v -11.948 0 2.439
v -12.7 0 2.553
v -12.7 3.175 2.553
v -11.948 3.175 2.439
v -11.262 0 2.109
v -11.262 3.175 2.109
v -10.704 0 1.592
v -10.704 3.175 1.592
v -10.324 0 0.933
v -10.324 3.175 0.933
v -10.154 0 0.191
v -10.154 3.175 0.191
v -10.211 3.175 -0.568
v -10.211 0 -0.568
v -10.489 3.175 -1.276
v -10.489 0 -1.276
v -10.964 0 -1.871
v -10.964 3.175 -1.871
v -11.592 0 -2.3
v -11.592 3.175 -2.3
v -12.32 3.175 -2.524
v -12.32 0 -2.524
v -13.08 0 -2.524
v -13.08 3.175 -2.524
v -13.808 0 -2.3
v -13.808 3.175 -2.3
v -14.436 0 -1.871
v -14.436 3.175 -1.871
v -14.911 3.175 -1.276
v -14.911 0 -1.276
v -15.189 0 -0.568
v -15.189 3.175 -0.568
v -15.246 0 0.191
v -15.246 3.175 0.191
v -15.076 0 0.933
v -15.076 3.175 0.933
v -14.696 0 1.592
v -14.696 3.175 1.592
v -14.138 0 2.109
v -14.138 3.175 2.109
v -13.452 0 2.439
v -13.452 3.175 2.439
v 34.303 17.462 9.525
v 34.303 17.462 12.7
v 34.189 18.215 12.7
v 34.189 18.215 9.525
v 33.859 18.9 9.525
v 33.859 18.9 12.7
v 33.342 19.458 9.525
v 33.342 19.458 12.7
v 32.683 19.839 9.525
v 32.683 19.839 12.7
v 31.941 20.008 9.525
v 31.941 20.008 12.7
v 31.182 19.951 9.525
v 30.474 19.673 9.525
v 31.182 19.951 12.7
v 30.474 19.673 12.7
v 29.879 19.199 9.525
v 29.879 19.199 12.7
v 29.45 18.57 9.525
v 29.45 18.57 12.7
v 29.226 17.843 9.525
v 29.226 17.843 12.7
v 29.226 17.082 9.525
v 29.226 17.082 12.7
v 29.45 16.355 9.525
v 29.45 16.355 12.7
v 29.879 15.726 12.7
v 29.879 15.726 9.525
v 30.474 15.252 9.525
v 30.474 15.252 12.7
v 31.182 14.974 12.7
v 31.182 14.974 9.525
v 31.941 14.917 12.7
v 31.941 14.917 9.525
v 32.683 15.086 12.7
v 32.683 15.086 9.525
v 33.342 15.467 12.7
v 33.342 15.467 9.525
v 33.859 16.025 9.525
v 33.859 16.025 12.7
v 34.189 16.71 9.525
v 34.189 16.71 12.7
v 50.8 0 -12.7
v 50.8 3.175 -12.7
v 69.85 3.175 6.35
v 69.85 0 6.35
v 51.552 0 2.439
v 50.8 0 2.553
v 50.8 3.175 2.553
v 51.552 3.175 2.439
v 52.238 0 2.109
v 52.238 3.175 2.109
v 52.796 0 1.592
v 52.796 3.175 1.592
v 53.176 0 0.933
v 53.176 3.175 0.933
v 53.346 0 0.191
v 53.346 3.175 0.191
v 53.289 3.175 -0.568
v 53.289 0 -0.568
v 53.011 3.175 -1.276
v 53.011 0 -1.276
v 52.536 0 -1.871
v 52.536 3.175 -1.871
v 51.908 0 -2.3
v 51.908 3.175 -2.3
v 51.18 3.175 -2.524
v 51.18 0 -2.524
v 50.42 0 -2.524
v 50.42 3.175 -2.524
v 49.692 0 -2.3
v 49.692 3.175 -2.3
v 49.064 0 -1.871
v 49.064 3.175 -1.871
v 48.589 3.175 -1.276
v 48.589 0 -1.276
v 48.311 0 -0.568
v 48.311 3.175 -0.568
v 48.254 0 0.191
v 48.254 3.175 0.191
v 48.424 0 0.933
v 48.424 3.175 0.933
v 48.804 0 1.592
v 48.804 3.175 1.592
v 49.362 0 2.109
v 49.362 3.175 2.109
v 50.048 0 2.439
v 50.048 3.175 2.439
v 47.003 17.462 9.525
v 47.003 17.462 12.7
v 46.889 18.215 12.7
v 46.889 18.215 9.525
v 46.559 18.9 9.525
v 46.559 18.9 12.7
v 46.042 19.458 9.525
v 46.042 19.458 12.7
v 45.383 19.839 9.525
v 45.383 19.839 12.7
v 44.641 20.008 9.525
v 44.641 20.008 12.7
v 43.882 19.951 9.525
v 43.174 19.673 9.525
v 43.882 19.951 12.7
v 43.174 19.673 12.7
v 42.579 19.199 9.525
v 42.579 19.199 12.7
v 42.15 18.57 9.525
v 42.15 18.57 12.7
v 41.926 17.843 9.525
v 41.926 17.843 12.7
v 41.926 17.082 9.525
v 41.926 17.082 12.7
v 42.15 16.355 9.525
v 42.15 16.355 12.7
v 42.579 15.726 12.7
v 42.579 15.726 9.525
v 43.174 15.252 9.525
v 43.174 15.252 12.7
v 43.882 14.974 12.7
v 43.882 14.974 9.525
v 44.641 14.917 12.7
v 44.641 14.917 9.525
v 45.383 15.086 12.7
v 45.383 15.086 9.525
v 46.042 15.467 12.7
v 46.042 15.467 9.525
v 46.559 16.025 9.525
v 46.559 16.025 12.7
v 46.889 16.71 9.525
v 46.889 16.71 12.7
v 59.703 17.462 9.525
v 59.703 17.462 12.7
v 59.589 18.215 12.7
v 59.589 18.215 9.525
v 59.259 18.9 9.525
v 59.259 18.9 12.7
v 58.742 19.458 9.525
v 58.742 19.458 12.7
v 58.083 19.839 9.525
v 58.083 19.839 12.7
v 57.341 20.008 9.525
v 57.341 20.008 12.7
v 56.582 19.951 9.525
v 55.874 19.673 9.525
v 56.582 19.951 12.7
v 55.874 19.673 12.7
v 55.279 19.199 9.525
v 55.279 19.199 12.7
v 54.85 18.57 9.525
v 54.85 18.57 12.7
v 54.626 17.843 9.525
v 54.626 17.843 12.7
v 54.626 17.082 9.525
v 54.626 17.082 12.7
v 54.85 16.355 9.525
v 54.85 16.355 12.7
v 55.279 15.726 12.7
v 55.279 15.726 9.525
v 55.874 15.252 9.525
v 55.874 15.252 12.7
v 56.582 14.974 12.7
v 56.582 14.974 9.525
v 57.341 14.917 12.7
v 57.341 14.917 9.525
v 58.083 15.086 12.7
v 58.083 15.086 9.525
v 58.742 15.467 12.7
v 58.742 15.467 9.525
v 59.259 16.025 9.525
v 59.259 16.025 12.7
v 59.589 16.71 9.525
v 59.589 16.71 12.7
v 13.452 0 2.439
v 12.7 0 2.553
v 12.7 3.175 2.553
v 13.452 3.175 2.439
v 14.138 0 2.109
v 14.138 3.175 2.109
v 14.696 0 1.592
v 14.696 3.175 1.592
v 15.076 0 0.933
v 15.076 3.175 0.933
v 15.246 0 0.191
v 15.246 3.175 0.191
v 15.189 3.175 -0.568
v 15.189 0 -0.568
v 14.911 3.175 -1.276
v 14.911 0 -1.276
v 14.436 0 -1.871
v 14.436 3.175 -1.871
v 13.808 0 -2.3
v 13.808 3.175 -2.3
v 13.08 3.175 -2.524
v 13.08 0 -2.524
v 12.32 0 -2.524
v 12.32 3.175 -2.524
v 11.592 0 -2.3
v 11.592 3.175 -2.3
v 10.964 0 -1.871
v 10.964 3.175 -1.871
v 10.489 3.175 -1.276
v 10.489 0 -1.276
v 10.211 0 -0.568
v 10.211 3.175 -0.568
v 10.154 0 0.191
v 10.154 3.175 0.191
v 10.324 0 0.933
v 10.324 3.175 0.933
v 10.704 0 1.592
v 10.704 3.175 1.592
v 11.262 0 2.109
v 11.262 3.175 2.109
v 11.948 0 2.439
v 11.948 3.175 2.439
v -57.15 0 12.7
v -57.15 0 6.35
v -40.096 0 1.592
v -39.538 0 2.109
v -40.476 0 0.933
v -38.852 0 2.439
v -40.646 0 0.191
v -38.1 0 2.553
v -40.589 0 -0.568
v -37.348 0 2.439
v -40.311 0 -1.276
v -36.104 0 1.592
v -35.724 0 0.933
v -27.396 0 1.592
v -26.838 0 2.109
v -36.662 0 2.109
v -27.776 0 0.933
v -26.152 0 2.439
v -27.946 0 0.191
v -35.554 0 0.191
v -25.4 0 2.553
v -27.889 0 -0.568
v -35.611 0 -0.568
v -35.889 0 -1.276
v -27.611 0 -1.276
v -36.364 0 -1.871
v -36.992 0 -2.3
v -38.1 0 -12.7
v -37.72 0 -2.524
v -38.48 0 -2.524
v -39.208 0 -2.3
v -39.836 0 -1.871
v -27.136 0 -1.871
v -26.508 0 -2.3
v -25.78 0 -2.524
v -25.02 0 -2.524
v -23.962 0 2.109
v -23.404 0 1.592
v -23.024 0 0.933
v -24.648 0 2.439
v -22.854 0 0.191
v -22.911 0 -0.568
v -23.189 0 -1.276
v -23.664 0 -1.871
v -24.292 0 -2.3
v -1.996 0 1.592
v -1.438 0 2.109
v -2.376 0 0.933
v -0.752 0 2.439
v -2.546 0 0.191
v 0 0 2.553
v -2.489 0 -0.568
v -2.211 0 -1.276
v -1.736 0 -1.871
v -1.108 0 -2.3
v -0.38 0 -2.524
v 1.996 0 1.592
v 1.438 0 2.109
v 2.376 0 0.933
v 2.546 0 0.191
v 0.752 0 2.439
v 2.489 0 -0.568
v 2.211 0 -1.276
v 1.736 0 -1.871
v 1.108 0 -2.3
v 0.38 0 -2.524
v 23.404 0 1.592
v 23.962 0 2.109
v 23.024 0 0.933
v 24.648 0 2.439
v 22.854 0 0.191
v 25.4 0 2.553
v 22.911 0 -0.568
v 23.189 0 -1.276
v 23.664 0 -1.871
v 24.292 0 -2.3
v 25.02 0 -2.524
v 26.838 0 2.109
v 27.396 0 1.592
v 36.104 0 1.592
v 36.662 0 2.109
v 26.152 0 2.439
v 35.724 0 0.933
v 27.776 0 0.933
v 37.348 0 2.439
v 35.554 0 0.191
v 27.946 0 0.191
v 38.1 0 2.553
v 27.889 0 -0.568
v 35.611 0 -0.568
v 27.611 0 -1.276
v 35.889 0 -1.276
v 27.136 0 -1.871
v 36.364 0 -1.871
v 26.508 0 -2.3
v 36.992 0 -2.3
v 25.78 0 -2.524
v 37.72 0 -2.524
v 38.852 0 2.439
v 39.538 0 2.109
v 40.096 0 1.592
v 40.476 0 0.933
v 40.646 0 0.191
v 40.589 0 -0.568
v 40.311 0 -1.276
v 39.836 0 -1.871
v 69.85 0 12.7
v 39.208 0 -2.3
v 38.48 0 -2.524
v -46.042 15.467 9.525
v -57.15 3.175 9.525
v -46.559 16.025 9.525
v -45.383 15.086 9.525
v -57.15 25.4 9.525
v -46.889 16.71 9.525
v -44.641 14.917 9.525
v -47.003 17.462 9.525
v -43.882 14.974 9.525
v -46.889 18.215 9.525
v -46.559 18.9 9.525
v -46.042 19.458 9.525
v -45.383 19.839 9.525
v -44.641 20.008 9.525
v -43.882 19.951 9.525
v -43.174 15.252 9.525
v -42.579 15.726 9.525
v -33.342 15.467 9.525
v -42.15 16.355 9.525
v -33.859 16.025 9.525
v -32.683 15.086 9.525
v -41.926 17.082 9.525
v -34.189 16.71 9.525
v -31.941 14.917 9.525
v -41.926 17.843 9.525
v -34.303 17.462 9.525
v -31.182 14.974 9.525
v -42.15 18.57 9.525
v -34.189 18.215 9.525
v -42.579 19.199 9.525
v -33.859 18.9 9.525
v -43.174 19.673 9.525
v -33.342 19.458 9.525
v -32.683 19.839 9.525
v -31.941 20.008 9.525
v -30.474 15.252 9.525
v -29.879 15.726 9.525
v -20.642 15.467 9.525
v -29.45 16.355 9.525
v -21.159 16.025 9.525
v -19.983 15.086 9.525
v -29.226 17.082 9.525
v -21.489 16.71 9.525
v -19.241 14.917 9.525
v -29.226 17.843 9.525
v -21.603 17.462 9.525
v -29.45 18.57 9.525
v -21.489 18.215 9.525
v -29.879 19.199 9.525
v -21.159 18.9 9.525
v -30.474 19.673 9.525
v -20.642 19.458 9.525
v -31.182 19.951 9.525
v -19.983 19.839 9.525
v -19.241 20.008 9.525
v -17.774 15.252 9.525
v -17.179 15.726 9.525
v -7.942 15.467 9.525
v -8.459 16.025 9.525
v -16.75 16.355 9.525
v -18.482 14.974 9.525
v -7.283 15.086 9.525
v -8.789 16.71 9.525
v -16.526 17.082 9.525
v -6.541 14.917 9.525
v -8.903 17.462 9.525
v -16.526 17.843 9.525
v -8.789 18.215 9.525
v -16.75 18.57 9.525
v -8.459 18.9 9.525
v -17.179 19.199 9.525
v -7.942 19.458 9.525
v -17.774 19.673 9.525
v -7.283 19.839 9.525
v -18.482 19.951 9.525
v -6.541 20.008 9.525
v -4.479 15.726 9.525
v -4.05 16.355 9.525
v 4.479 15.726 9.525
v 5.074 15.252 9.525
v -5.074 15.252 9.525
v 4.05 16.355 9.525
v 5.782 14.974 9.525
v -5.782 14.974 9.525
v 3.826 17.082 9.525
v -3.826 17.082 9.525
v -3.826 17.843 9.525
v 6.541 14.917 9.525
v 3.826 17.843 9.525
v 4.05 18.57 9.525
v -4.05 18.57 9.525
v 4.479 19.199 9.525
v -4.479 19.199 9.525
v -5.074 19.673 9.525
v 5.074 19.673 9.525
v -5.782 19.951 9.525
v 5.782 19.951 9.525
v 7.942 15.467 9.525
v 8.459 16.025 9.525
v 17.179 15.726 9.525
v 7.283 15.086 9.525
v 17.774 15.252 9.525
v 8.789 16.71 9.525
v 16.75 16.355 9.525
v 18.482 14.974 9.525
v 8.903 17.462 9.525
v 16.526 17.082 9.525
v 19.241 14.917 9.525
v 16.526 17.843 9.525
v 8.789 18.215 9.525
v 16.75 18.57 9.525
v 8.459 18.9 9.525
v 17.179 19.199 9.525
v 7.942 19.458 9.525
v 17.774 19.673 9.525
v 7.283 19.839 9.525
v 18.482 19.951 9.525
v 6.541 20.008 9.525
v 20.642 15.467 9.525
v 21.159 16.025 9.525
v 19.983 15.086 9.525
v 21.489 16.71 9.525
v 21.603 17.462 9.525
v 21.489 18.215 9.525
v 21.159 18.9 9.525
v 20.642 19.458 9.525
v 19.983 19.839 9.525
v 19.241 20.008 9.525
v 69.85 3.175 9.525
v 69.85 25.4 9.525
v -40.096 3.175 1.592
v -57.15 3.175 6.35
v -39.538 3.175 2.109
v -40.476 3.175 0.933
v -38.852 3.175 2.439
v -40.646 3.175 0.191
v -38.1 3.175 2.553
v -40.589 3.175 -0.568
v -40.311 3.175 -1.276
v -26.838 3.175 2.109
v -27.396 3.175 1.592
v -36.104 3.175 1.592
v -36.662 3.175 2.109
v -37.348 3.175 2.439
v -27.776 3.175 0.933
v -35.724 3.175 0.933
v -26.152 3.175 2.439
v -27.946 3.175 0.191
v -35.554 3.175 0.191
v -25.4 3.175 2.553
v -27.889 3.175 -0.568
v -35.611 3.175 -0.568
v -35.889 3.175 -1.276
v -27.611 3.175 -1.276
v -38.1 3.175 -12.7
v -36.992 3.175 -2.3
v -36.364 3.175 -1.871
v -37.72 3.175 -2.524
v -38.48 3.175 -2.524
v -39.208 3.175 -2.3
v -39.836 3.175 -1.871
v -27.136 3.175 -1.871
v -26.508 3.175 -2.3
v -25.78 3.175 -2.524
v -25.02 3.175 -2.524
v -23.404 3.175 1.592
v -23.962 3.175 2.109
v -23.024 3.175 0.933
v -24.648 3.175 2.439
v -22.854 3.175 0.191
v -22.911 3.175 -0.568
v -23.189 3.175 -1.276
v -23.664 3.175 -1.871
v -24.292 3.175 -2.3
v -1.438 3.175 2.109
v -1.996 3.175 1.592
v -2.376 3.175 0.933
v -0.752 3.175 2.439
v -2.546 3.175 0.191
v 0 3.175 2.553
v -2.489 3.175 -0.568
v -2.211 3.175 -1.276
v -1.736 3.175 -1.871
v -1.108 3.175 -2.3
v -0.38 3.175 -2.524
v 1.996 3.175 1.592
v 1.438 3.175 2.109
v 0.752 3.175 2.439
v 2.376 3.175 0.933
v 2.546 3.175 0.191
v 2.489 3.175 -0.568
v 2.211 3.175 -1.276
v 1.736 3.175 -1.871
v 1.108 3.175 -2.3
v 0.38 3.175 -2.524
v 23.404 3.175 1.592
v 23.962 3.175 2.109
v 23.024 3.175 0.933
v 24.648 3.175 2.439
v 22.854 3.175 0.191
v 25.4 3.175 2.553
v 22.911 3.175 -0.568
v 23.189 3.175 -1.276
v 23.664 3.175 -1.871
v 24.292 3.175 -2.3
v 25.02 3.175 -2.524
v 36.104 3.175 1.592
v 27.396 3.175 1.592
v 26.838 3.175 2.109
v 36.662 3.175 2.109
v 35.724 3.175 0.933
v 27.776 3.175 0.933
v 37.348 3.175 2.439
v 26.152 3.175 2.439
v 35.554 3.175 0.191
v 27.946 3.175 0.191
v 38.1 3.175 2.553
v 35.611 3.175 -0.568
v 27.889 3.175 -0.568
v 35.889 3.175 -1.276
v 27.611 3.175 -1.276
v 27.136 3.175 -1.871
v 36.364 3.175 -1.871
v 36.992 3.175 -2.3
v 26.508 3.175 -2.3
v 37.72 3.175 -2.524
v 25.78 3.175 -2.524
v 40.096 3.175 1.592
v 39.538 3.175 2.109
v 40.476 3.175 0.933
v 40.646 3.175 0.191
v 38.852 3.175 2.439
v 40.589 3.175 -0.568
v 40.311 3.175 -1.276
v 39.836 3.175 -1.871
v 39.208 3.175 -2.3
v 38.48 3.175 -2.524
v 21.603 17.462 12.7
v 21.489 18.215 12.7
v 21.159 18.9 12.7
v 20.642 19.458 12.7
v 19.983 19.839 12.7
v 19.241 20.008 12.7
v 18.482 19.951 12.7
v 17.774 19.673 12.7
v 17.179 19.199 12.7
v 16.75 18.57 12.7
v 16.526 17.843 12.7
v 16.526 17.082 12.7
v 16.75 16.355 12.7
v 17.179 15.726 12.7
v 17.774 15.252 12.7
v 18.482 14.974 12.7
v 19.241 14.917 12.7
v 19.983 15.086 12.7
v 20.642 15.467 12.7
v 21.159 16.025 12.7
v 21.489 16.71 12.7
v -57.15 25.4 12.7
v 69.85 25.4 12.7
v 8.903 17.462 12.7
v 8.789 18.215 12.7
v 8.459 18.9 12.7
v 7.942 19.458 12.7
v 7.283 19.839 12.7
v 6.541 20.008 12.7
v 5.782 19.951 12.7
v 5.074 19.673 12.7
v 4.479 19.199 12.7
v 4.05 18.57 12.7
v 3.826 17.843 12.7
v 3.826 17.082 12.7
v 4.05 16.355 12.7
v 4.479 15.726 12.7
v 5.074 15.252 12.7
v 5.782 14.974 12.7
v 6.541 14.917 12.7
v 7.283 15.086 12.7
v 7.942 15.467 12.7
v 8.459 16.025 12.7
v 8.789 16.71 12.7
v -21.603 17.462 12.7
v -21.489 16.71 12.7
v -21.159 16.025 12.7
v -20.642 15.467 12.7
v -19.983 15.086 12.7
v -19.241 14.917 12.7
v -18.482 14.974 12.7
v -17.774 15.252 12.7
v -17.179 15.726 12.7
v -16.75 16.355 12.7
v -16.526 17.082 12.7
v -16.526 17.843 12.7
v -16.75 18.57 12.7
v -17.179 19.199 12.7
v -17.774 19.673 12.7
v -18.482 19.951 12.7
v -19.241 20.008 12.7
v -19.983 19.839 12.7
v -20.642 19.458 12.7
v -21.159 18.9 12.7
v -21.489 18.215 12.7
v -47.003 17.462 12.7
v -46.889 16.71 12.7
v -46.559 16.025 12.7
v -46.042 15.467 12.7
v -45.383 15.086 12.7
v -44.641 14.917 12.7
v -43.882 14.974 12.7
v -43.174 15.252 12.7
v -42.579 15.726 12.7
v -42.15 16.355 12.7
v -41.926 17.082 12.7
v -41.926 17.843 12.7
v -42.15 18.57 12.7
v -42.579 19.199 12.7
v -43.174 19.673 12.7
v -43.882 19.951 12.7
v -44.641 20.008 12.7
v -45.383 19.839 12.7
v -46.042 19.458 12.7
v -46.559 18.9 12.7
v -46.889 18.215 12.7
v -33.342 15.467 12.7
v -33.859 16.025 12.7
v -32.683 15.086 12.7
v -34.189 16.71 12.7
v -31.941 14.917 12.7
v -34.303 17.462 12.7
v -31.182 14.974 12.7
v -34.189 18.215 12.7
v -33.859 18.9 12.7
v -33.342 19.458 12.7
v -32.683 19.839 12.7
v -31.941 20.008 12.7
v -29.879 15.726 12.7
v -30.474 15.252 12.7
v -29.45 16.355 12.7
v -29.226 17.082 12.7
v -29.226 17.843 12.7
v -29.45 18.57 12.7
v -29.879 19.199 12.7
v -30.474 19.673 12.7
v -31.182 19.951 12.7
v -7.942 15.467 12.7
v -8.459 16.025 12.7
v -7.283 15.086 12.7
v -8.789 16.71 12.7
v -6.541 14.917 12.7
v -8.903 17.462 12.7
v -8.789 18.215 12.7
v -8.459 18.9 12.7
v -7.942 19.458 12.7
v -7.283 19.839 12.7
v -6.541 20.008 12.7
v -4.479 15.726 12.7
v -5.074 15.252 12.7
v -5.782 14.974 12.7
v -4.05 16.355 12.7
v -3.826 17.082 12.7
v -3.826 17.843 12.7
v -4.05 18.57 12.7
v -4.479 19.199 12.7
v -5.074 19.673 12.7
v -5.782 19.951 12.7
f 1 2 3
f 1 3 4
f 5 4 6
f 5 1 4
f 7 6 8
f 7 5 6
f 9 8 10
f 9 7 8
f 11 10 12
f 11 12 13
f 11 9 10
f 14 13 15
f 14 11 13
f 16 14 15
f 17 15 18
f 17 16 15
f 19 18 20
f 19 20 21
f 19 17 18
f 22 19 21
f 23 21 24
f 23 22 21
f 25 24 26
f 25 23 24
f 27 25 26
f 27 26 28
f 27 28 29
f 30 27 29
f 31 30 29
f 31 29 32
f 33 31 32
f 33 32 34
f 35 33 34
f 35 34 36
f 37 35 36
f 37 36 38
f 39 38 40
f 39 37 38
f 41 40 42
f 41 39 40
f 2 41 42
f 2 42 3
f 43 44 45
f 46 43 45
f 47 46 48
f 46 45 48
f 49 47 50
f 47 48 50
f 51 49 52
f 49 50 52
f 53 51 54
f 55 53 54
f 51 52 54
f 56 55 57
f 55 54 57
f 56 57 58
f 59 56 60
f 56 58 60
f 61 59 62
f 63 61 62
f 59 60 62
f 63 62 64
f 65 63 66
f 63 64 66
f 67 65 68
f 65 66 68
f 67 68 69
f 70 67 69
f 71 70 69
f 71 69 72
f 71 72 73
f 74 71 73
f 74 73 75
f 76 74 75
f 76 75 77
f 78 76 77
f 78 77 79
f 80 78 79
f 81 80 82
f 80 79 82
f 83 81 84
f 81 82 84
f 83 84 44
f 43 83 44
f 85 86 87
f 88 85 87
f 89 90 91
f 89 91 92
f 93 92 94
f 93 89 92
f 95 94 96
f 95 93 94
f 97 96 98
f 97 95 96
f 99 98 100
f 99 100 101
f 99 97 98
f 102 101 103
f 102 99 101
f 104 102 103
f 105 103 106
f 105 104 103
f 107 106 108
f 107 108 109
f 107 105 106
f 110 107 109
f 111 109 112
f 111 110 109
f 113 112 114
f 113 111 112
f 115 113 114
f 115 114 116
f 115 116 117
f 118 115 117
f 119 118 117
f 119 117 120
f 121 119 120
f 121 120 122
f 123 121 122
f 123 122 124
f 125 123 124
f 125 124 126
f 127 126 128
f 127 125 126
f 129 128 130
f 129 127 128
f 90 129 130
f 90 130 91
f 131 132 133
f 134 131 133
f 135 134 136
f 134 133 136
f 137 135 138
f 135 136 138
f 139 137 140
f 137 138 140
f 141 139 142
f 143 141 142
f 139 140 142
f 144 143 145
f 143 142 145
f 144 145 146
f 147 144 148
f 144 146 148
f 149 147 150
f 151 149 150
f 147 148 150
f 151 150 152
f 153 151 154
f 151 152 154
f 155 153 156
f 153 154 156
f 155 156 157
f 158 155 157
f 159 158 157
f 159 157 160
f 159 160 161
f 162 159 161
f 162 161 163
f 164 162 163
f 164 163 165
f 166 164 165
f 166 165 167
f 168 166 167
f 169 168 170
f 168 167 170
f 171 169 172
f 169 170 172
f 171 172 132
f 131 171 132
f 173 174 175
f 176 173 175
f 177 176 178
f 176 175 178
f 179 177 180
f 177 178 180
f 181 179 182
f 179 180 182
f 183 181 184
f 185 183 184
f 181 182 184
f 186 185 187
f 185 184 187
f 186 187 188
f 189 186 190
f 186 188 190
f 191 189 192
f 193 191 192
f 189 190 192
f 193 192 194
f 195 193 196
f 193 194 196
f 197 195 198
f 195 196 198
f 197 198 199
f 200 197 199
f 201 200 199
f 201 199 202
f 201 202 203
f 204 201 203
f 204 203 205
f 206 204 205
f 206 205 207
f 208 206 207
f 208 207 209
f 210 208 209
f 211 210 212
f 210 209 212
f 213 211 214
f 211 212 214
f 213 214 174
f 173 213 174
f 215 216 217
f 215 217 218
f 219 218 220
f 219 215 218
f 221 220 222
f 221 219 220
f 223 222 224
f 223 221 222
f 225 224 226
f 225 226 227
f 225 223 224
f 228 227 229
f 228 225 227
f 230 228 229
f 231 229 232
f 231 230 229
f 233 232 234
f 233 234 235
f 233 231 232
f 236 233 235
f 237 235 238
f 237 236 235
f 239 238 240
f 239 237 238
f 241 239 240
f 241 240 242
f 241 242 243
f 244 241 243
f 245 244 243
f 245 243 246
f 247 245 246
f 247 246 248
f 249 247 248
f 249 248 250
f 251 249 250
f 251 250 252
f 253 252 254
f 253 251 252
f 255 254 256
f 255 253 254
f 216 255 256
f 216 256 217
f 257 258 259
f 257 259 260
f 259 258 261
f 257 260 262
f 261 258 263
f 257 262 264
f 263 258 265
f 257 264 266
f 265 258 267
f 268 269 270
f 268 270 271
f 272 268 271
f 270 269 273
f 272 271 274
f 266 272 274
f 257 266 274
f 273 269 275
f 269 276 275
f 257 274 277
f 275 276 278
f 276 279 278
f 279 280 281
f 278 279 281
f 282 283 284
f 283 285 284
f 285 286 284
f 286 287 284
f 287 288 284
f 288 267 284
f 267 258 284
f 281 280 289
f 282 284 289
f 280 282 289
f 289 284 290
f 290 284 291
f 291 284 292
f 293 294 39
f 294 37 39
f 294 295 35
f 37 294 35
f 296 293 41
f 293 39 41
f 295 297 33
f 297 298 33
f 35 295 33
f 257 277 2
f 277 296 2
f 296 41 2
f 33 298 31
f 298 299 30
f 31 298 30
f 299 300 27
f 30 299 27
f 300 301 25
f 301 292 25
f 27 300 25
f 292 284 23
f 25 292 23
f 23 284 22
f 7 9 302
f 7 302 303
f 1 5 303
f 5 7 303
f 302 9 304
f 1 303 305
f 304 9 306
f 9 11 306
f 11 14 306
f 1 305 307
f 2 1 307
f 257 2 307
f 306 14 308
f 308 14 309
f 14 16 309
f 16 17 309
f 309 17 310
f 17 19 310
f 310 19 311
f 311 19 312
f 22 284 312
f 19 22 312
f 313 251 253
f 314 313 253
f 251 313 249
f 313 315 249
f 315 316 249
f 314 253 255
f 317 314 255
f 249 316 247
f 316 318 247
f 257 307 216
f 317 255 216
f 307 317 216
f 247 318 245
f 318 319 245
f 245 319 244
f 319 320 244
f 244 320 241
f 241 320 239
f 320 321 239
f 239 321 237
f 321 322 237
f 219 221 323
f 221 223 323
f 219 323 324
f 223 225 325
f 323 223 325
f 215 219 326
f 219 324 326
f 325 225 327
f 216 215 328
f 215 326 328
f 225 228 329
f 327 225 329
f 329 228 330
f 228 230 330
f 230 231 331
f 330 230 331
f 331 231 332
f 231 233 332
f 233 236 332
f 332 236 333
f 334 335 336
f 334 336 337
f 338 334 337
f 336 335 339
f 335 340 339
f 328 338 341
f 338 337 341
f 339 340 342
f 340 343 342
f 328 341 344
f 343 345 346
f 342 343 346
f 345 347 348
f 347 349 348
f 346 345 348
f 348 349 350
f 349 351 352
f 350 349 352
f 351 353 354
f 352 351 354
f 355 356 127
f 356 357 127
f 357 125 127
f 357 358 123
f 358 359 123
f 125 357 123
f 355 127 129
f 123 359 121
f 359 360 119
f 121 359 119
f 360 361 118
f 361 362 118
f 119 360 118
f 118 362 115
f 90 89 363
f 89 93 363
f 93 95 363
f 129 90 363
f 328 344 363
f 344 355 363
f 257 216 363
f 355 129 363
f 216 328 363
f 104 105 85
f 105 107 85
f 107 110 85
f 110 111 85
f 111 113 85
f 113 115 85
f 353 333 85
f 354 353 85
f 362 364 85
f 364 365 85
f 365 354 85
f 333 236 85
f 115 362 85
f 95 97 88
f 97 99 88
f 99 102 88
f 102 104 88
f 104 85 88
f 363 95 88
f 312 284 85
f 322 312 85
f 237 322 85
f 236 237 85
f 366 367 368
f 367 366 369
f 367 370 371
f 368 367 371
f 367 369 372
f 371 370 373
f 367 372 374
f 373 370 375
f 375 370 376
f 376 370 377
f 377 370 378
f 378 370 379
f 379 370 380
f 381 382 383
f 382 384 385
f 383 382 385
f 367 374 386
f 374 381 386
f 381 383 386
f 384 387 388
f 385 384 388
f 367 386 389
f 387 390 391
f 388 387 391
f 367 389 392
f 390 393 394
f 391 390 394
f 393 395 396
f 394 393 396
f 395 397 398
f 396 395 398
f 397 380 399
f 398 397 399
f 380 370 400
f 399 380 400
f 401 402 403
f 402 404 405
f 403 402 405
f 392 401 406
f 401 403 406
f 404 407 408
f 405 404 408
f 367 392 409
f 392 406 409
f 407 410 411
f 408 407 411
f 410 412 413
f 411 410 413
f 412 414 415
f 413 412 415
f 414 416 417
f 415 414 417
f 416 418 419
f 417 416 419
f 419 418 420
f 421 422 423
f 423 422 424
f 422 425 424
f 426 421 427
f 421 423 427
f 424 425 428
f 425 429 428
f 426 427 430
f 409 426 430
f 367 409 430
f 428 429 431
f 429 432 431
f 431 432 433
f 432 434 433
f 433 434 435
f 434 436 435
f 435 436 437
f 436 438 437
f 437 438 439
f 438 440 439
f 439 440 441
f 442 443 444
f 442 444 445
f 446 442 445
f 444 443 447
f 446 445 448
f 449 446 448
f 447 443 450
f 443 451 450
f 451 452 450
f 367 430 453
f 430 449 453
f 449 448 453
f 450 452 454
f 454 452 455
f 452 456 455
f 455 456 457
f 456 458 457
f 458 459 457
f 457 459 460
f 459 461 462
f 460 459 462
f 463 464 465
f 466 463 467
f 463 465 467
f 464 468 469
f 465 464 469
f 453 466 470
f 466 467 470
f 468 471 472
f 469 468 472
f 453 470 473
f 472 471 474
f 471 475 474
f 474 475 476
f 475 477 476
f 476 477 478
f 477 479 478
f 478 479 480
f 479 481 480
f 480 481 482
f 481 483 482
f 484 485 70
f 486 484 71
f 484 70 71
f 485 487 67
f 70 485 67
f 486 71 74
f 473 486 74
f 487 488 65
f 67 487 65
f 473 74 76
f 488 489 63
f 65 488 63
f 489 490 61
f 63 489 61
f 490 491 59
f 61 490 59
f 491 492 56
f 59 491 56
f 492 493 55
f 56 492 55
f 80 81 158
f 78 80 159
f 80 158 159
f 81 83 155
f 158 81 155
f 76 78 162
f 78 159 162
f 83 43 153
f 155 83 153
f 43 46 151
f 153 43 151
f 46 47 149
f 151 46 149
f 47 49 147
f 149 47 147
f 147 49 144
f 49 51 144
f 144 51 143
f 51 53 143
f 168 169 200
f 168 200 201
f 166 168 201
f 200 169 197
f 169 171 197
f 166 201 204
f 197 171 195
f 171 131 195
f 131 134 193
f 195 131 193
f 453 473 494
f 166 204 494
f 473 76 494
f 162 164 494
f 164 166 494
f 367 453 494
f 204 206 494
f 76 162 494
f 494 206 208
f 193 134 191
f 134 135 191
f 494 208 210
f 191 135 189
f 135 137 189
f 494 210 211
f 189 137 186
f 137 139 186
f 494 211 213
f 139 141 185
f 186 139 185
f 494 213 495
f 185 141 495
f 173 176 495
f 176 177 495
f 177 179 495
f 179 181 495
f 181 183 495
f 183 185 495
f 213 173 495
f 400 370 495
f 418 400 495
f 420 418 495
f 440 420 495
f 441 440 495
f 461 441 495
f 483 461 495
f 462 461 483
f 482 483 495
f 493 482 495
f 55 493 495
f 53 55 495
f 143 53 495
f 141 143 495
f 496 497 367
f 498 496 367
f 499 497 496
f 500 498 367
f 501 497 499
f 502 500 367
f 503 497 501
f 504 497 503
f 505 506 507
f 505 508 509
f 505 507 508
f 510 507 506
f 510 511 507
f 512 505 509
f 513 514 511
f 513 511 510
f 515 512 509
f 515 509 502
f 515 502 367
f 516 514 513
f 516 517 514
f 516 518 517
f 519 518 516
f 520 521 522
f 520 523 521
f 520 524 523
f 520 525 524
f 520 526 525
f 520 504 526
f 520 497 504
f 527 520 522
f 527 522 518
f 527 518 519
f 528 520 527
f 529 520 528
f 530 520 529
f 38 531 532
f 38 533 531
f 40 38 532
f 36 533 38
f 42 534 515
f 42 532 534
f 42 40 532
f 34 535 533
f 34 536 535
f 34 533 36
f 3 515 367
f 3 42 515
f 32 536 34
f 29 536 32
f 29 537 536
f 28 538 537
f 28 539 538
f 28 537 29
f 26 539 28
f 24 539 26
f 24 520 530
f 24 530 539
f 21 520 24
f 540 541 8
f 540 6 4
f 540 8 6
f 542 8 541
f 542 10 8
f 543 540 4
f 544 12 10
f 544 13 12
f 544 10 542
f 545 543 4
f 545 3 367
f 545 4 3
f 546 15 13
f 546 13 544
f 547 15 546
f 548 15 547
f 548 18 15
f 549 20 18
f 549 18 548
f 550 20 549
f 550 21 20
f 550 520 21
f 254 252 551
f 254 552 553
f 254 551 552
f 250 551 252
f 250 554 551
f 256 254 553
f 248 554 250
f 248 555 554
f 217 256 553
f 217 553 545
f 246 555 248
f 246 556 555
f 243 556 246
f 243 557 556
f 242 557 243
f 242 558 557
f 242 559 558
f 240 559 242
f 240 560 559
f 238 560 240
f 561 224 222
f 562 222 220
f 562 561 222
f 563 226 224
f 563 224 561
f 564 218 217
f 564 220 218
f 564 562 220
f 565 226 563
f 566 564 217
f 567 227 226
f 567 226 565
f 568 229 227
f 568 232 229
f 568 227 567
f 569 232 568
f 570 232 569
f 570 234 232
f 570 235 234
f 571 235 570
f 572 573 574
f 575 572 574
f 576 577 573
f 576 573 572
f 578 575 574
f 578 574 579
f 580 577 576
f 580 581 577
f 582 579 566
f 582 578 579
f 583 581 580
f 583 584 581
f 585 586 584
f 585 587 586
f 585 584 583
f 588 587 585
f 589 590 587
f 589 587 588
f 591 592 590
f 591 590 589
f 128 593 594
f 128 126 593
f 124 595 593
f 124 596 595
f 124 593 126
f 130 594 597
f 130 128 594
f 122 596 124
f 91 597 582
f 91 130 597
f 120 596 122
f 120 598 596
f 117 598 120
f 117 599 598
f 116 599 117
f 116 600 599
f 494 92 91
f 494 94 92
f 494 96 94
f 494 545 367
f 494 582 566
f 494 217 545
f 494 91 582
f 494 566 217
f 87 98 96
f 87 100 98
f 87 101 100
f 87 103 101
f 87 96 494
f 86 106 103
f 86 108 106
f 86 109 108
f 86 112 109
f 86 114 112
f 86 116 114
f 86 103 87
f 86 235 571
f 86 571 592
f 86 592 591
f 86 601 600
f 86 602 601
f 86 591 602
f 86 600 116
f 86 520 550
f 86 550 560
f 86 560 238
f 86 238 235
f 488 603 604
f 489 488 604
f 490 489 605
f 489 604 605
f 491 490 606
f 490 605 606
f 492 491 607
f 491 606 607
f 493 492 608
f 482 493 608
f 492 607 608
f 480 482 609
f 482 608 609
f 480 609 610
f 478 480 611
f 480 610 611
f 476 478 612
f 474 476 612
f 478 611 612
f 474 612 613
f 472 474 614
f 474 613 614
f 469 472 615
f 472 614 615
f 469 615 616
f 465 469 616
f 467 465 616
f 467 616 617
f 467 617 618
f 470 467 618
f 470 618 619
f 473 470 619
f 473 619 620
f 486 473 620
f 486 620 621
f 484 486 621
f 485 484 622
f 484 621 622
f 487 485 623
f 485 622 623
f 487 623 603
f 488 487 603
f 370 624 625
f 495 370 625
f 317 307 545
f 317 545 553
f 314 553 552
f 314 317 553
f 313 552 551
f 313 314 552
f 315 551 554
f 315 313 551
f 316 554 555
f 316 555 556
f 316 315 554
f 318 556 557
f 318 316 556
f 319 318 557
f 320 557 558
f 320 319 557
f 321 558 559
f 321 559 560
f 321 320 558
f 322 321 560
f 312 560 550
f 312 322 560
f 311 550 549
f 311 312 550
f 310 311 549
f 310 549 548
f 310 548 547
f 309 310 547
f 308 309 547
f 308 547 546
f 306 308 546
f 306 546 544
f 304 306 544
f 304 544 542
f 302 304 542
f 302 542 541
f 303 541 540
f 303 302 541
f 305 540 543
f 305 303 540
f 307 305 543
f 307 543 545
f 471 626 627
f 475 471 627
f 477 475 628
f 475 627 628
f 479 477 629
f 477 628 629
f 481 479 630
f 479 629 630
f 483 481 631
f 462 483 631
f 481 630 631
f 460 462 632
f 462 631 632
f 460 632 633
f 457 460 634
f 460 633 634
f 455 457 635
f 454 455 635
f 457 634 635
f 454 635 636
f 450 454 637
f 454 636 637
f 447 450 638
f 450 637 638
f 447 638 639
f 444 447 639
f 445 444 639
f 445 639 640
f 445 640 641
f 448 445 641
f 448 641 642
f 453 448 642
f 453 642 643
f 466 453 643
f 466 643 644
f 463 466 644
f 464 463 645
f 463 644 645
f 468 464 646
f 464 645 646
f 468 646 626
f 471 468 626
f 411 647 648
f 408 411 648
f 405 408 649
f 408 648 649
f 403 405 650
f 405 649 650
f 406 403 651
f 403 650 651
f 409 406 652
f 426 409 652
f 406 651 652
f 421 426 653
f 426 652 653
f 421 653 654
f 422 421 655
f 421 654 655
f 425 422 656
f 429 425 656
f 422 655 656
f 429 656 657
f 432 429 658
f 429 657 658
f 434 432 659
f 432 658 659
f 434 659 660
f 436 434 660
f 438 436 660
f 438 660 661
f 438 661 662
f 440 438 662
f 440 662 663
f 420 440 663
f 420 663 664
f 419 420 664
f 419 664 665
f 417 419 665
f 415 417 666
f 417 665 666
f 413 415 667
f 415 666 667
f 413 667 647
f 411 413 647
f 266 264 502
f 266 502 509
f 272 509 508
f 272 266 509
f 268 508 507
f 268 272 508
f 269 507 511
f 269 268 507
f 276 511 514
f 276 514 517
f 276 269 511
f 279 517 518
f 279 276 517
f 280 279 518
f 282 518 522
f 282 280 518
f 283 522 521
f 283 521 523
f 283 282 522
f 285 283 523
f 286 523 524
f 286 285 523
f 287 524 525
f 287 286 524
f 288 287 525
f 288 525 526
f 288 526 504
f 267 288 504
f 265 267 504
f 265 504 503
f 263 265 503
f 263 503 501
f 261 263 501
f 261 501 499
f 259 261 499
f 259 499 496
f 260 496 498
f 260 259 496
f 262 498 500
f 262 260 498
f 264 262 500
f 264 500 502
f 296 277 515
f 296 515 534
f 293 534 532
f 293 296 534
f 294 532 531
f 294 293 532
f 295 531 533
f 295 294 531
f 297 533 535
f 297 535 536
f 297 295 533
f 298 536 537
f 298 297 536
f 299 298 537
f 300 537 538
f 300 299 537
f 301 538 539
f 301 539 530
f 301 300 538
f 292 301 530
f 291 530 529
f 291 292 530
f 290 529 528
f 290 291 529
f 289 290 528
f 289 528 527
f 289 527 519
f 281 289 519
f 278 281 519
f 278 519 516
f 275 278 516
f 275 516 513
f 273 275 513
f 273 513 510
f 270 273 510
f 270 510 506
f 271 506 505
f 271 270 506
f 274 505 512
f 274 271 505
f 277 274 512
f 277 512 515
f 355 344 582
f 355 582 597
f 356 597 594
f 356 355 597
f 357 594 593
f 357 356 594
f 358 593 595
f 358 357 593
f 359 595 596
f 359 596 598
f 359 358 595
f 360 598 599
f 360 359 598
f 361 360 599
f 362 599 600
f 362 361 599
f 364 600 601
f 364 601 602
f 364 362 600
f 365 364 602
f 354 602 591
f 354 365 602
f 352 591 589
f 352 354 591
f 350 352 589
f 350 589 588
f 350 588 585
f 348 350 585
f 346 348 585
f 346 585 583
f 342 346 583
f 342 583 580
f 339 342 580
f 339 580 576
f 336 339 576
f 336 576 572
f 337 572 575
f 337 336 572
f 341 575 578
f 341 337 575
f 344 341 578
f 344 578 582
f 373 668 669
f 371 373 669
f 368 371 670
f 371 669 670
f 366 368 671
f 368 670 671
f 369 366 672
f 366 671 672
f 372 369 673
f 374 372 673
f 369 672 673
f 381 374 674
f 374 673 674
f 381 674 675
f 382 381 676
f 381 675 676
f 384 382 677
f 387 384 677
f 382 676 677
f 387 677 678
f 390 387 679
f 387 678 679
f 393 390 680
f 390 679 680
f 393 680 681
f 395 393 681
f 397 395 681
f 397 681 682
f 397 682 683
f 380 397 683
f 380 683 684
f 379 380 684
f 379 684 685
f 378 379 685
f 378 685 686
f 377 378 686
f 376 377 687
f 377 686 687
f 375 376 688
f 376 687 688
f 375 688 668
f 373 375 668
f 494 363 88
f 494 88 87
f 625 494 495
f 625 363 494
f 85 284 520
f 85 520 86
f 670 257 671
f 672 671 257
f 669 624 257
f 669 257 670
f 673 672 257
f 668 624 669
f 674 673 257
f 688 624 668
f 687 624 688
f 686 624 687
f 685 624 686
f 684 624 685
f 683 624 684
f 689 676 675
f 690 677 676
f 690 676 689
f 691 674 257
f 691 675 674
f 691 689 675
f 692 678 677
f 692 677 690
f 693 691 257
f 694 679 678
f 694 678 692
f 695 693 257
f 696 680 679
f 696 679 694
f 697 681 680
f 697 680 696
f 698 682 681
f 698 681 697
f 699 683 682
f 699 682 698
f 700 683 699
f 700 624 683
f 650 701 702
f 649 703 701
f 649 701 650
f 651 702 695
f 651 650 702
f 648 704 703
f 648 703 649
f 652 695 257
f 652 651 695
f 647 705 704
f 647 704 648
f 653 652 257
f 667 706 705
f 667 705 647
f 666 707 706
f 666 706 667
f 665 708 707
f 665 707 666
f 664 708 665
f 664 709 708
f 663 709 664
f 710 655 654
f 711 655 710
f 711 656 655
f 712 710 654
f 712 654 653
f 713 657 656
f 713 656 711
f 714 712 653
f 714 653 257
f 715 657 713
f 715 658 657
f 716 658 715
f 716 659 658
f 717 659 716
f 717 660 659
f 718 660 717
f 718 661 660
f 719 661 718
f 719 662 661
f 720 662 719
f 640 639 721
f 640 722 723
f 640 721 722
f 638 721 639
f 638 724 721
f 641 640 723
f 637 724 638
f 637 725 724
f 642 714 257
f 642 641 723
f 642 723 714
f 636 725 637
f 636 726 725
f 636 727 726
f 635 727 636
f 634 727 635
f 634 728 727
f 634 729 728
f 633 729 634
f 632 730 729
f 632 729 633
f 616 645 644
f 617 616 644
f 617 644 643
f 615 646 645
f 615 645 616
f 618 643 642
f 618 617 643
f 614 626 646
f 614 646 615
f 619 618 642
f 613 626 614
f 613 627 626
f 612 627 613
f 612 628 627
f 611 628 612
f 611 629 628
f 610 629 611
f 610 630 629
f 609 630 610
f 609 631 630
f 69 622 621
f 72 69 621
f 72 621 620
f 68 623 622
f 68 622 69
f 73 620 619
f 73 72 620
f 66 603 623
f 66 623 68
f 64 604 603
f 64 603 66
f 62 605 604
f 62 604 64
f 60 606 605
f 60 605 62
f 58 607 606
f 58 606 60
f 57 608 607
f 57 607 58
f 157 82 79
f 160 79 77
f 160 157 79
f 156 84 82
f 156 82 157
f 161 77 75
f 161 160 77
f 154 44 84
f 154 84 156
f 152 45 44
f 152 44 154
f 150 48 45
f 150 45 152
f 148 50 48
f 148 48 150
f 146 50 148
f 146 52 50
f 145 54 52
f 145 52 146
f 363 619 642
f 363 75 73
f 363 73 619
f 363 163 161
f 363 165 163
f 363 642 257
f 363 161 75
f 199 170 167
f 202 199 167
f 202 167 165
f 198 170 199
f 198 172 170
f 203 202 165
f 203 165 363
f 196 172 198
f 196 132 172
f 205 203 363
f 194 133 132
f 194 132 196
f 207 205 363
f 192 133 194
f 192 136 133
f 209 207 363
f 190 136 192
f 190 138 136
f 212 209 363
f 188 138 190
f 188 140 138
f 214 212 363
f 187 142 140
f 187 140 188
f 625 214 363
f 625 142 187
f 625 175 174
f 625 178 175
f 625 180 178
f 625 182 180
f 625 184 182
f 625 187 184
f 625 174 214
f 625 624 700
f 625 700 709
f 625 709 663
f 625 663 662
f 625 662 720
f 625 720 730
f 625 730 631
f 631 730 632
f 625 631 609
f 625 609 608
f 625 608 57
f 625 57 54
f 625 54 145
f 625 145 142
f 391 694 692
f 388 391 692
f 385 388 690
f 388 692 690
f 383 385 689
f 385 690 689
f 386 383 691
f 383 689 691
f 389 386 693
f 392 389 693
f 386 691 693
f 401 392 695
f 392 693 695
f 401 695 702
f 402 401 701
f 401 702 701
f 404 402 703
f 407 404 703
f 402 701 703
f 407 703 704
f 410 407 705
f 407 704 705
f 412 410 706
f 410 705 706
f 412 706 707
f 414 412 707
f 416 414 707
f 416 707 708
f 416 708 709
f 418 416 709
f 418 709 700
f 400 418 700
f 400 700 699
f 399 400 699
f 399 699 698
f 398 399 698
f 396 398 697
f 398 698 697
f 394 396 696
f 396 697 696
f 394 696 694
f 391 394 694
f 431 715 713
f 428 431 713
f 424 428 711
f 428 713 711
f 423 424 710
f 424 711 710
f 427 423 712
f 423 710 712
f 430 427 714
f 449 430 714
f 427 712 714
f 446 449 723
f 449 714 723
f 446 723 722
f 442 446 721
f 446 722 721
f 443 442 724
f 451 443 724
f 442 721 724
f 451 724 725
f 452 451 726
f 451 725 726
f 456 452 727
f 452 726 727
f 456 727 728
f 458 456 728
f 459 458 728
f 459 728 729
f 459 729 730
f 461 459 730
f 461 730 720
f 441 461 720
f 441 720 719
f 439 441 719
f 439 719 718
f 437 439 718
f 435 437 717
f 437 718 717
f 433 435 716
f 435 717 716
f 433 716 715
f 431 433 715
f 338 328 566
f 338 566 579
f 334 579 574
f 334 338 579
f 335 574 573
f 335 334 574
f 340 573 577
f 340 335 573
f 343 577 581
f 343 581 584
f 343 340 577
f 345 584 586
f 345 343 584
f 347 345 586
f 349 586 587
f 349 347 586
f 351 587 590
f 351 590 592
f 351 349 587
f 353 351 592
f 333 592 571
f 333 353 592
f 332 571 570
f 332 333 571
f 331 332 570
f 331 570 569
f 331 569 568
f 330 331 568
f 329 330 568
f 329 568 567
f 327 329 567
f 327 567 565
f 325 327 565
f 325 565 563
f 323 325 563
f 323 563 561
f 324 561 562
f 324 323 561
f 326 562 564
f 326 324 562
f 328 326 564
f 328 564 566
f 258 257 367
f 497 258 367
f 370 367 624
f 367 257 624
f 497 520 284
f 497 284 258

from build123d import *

# Parameters (mm, degrees)
SKETCH2_W           = 127
SKETCH2_H           = 25.4
SKETCH2_R           = 2.5527
BOSS_EXTRUDE1_DEPTH = 3.175
SKETCH4_W           = 127
SKETCH4_H           = 22.225
SKETCH4_R           = 2.5527
BOSS_EXTRUDE3_DEPTH = 3.175
CUT_EXTRUDE1_DEPTH  = 75.392628163


with BuildPart() as part:
    # Sketch2 → Boss-Extrude1 (new body)
    with BuildSketch(Plane(origin=(0, 0, 0), x_dir=(1, 0, 0), z_dir=(0, 1, 0))):
        with Locations((6.35, 0)):
            Rectangle(SKETCH2_W, SKETCH2_H)
        with Locations(Location((0, 0, 0), (0, 0, 270))):
            Circle(SKETCH2_R, mode=Mode.SUBTRACT)
        with Locations(Location((12.7, 0, 0), (0, 0, 270))):
            Circle(SKETCH2_R, mode=Mode.SUBTRACT)
        with Locations(Location((25.4, 0, 0), (0, 0, 270))):
            Circle(SKETCH2_R, mode=Mode.SUBTRACT)
        with Locations(Location((38.1, 0, 0), (0, 0, 270))):
            Circle(SKETCH2_R, mode=Mode.SUBTRACT)
        with Locations(Location((-12.7, 0, 0), (0, 0, 270))):
            Circle(SKETCH2_R, mode=Mode.SUBTRACT)
        with Locations(Location((-25.4, 0, 0), (0, 0, 270))):
            Circle(SKETCH2_R, mode=Mode.SUBTRACT)
        with Locations(Location((-38.1, 0, 0), (0, 0, 270))):
            Circle(SKETCH2_R, mode=Mode.SUBTRACT)
        with Locations(Location((50.8, 0, 0), (0, 0, 270))):
            Circle(SKETCH2_R, mode=Mode.SUBTRACT)
    extrude(amount=BOSS_EXTRUDE1_DEPTH)

    # Sketch4 → Boss-Extrude3 (add)
    with BuildSketch(Plane.XY.offset(12.7)):
        with Locations((6.35, 14.2875)):
            Rectangle(SKETCH4_W, SKETCH4_H)
        with Locations((6.35, 17.4625)):
            Circle(SKETCH4_R, mode=Mode.SUBTRACT)
        with Locations((19.05, 17.4625)):
            Circle(SKETCH4_R, mode=Mode.SUBTRACT)
        with Locations((31.75, 17.4625)):
            Circle(SKETCH4_R, mode=Mode.SUBTRACT)
        with Locations((44.45, 17.4625)):
            Circle(SKETCH4_R, mode=Mode.SUBTRACT)
        with Locations((57.15, 17.4625)):
            Circle(SKETCH4_R, mode=Mode.SUBTRACT)
        with Locations(Location((-44.45, 17.4625, 0), (0, 0, 180))):
            Circle(SKETCH4_R, mode=Mode.SUBTRACT)
        with Locations(Location((-31.75, 17.4625, 0), (0, 0, 180))):
            Circle(SKETCH4_R, mode=Mode.SUBTRACT)
        with Locations(Location((-19.05, 17.4625, 0), (0, 0, 180))):
            Circle(SKETCH4_R, mode=Mode.SUBTRACT)
        with Locations(Location((-6.35, 17.4625, 0), (0, 0, 180))):
            Circle(SKETCH4_R, mode=Mode.SUBTRACT)
    extrude(amount=-BOSS_EXTRUDE3_DEPTH)

    # Sketch5 → Cut-Extrude1 (cut, through all)
    with BuildSketch(Plane(origin=(0, 3.175, 0), x_dir=(1, 0, 0), z_dir=(0, 1, 0))):
        Polygon((-38.1, 12.7), (-57.15, -6.35), (-57.15, 12.7), align=None)
        Polygon((50.8, 12.7), (69.85, -6.35), (69.85, 12.7), align=None)
    extrude(amount=-CUT_EXTRUDE1_DEPTH, mode=Mode.SUBTRACT)


solid = part.part
